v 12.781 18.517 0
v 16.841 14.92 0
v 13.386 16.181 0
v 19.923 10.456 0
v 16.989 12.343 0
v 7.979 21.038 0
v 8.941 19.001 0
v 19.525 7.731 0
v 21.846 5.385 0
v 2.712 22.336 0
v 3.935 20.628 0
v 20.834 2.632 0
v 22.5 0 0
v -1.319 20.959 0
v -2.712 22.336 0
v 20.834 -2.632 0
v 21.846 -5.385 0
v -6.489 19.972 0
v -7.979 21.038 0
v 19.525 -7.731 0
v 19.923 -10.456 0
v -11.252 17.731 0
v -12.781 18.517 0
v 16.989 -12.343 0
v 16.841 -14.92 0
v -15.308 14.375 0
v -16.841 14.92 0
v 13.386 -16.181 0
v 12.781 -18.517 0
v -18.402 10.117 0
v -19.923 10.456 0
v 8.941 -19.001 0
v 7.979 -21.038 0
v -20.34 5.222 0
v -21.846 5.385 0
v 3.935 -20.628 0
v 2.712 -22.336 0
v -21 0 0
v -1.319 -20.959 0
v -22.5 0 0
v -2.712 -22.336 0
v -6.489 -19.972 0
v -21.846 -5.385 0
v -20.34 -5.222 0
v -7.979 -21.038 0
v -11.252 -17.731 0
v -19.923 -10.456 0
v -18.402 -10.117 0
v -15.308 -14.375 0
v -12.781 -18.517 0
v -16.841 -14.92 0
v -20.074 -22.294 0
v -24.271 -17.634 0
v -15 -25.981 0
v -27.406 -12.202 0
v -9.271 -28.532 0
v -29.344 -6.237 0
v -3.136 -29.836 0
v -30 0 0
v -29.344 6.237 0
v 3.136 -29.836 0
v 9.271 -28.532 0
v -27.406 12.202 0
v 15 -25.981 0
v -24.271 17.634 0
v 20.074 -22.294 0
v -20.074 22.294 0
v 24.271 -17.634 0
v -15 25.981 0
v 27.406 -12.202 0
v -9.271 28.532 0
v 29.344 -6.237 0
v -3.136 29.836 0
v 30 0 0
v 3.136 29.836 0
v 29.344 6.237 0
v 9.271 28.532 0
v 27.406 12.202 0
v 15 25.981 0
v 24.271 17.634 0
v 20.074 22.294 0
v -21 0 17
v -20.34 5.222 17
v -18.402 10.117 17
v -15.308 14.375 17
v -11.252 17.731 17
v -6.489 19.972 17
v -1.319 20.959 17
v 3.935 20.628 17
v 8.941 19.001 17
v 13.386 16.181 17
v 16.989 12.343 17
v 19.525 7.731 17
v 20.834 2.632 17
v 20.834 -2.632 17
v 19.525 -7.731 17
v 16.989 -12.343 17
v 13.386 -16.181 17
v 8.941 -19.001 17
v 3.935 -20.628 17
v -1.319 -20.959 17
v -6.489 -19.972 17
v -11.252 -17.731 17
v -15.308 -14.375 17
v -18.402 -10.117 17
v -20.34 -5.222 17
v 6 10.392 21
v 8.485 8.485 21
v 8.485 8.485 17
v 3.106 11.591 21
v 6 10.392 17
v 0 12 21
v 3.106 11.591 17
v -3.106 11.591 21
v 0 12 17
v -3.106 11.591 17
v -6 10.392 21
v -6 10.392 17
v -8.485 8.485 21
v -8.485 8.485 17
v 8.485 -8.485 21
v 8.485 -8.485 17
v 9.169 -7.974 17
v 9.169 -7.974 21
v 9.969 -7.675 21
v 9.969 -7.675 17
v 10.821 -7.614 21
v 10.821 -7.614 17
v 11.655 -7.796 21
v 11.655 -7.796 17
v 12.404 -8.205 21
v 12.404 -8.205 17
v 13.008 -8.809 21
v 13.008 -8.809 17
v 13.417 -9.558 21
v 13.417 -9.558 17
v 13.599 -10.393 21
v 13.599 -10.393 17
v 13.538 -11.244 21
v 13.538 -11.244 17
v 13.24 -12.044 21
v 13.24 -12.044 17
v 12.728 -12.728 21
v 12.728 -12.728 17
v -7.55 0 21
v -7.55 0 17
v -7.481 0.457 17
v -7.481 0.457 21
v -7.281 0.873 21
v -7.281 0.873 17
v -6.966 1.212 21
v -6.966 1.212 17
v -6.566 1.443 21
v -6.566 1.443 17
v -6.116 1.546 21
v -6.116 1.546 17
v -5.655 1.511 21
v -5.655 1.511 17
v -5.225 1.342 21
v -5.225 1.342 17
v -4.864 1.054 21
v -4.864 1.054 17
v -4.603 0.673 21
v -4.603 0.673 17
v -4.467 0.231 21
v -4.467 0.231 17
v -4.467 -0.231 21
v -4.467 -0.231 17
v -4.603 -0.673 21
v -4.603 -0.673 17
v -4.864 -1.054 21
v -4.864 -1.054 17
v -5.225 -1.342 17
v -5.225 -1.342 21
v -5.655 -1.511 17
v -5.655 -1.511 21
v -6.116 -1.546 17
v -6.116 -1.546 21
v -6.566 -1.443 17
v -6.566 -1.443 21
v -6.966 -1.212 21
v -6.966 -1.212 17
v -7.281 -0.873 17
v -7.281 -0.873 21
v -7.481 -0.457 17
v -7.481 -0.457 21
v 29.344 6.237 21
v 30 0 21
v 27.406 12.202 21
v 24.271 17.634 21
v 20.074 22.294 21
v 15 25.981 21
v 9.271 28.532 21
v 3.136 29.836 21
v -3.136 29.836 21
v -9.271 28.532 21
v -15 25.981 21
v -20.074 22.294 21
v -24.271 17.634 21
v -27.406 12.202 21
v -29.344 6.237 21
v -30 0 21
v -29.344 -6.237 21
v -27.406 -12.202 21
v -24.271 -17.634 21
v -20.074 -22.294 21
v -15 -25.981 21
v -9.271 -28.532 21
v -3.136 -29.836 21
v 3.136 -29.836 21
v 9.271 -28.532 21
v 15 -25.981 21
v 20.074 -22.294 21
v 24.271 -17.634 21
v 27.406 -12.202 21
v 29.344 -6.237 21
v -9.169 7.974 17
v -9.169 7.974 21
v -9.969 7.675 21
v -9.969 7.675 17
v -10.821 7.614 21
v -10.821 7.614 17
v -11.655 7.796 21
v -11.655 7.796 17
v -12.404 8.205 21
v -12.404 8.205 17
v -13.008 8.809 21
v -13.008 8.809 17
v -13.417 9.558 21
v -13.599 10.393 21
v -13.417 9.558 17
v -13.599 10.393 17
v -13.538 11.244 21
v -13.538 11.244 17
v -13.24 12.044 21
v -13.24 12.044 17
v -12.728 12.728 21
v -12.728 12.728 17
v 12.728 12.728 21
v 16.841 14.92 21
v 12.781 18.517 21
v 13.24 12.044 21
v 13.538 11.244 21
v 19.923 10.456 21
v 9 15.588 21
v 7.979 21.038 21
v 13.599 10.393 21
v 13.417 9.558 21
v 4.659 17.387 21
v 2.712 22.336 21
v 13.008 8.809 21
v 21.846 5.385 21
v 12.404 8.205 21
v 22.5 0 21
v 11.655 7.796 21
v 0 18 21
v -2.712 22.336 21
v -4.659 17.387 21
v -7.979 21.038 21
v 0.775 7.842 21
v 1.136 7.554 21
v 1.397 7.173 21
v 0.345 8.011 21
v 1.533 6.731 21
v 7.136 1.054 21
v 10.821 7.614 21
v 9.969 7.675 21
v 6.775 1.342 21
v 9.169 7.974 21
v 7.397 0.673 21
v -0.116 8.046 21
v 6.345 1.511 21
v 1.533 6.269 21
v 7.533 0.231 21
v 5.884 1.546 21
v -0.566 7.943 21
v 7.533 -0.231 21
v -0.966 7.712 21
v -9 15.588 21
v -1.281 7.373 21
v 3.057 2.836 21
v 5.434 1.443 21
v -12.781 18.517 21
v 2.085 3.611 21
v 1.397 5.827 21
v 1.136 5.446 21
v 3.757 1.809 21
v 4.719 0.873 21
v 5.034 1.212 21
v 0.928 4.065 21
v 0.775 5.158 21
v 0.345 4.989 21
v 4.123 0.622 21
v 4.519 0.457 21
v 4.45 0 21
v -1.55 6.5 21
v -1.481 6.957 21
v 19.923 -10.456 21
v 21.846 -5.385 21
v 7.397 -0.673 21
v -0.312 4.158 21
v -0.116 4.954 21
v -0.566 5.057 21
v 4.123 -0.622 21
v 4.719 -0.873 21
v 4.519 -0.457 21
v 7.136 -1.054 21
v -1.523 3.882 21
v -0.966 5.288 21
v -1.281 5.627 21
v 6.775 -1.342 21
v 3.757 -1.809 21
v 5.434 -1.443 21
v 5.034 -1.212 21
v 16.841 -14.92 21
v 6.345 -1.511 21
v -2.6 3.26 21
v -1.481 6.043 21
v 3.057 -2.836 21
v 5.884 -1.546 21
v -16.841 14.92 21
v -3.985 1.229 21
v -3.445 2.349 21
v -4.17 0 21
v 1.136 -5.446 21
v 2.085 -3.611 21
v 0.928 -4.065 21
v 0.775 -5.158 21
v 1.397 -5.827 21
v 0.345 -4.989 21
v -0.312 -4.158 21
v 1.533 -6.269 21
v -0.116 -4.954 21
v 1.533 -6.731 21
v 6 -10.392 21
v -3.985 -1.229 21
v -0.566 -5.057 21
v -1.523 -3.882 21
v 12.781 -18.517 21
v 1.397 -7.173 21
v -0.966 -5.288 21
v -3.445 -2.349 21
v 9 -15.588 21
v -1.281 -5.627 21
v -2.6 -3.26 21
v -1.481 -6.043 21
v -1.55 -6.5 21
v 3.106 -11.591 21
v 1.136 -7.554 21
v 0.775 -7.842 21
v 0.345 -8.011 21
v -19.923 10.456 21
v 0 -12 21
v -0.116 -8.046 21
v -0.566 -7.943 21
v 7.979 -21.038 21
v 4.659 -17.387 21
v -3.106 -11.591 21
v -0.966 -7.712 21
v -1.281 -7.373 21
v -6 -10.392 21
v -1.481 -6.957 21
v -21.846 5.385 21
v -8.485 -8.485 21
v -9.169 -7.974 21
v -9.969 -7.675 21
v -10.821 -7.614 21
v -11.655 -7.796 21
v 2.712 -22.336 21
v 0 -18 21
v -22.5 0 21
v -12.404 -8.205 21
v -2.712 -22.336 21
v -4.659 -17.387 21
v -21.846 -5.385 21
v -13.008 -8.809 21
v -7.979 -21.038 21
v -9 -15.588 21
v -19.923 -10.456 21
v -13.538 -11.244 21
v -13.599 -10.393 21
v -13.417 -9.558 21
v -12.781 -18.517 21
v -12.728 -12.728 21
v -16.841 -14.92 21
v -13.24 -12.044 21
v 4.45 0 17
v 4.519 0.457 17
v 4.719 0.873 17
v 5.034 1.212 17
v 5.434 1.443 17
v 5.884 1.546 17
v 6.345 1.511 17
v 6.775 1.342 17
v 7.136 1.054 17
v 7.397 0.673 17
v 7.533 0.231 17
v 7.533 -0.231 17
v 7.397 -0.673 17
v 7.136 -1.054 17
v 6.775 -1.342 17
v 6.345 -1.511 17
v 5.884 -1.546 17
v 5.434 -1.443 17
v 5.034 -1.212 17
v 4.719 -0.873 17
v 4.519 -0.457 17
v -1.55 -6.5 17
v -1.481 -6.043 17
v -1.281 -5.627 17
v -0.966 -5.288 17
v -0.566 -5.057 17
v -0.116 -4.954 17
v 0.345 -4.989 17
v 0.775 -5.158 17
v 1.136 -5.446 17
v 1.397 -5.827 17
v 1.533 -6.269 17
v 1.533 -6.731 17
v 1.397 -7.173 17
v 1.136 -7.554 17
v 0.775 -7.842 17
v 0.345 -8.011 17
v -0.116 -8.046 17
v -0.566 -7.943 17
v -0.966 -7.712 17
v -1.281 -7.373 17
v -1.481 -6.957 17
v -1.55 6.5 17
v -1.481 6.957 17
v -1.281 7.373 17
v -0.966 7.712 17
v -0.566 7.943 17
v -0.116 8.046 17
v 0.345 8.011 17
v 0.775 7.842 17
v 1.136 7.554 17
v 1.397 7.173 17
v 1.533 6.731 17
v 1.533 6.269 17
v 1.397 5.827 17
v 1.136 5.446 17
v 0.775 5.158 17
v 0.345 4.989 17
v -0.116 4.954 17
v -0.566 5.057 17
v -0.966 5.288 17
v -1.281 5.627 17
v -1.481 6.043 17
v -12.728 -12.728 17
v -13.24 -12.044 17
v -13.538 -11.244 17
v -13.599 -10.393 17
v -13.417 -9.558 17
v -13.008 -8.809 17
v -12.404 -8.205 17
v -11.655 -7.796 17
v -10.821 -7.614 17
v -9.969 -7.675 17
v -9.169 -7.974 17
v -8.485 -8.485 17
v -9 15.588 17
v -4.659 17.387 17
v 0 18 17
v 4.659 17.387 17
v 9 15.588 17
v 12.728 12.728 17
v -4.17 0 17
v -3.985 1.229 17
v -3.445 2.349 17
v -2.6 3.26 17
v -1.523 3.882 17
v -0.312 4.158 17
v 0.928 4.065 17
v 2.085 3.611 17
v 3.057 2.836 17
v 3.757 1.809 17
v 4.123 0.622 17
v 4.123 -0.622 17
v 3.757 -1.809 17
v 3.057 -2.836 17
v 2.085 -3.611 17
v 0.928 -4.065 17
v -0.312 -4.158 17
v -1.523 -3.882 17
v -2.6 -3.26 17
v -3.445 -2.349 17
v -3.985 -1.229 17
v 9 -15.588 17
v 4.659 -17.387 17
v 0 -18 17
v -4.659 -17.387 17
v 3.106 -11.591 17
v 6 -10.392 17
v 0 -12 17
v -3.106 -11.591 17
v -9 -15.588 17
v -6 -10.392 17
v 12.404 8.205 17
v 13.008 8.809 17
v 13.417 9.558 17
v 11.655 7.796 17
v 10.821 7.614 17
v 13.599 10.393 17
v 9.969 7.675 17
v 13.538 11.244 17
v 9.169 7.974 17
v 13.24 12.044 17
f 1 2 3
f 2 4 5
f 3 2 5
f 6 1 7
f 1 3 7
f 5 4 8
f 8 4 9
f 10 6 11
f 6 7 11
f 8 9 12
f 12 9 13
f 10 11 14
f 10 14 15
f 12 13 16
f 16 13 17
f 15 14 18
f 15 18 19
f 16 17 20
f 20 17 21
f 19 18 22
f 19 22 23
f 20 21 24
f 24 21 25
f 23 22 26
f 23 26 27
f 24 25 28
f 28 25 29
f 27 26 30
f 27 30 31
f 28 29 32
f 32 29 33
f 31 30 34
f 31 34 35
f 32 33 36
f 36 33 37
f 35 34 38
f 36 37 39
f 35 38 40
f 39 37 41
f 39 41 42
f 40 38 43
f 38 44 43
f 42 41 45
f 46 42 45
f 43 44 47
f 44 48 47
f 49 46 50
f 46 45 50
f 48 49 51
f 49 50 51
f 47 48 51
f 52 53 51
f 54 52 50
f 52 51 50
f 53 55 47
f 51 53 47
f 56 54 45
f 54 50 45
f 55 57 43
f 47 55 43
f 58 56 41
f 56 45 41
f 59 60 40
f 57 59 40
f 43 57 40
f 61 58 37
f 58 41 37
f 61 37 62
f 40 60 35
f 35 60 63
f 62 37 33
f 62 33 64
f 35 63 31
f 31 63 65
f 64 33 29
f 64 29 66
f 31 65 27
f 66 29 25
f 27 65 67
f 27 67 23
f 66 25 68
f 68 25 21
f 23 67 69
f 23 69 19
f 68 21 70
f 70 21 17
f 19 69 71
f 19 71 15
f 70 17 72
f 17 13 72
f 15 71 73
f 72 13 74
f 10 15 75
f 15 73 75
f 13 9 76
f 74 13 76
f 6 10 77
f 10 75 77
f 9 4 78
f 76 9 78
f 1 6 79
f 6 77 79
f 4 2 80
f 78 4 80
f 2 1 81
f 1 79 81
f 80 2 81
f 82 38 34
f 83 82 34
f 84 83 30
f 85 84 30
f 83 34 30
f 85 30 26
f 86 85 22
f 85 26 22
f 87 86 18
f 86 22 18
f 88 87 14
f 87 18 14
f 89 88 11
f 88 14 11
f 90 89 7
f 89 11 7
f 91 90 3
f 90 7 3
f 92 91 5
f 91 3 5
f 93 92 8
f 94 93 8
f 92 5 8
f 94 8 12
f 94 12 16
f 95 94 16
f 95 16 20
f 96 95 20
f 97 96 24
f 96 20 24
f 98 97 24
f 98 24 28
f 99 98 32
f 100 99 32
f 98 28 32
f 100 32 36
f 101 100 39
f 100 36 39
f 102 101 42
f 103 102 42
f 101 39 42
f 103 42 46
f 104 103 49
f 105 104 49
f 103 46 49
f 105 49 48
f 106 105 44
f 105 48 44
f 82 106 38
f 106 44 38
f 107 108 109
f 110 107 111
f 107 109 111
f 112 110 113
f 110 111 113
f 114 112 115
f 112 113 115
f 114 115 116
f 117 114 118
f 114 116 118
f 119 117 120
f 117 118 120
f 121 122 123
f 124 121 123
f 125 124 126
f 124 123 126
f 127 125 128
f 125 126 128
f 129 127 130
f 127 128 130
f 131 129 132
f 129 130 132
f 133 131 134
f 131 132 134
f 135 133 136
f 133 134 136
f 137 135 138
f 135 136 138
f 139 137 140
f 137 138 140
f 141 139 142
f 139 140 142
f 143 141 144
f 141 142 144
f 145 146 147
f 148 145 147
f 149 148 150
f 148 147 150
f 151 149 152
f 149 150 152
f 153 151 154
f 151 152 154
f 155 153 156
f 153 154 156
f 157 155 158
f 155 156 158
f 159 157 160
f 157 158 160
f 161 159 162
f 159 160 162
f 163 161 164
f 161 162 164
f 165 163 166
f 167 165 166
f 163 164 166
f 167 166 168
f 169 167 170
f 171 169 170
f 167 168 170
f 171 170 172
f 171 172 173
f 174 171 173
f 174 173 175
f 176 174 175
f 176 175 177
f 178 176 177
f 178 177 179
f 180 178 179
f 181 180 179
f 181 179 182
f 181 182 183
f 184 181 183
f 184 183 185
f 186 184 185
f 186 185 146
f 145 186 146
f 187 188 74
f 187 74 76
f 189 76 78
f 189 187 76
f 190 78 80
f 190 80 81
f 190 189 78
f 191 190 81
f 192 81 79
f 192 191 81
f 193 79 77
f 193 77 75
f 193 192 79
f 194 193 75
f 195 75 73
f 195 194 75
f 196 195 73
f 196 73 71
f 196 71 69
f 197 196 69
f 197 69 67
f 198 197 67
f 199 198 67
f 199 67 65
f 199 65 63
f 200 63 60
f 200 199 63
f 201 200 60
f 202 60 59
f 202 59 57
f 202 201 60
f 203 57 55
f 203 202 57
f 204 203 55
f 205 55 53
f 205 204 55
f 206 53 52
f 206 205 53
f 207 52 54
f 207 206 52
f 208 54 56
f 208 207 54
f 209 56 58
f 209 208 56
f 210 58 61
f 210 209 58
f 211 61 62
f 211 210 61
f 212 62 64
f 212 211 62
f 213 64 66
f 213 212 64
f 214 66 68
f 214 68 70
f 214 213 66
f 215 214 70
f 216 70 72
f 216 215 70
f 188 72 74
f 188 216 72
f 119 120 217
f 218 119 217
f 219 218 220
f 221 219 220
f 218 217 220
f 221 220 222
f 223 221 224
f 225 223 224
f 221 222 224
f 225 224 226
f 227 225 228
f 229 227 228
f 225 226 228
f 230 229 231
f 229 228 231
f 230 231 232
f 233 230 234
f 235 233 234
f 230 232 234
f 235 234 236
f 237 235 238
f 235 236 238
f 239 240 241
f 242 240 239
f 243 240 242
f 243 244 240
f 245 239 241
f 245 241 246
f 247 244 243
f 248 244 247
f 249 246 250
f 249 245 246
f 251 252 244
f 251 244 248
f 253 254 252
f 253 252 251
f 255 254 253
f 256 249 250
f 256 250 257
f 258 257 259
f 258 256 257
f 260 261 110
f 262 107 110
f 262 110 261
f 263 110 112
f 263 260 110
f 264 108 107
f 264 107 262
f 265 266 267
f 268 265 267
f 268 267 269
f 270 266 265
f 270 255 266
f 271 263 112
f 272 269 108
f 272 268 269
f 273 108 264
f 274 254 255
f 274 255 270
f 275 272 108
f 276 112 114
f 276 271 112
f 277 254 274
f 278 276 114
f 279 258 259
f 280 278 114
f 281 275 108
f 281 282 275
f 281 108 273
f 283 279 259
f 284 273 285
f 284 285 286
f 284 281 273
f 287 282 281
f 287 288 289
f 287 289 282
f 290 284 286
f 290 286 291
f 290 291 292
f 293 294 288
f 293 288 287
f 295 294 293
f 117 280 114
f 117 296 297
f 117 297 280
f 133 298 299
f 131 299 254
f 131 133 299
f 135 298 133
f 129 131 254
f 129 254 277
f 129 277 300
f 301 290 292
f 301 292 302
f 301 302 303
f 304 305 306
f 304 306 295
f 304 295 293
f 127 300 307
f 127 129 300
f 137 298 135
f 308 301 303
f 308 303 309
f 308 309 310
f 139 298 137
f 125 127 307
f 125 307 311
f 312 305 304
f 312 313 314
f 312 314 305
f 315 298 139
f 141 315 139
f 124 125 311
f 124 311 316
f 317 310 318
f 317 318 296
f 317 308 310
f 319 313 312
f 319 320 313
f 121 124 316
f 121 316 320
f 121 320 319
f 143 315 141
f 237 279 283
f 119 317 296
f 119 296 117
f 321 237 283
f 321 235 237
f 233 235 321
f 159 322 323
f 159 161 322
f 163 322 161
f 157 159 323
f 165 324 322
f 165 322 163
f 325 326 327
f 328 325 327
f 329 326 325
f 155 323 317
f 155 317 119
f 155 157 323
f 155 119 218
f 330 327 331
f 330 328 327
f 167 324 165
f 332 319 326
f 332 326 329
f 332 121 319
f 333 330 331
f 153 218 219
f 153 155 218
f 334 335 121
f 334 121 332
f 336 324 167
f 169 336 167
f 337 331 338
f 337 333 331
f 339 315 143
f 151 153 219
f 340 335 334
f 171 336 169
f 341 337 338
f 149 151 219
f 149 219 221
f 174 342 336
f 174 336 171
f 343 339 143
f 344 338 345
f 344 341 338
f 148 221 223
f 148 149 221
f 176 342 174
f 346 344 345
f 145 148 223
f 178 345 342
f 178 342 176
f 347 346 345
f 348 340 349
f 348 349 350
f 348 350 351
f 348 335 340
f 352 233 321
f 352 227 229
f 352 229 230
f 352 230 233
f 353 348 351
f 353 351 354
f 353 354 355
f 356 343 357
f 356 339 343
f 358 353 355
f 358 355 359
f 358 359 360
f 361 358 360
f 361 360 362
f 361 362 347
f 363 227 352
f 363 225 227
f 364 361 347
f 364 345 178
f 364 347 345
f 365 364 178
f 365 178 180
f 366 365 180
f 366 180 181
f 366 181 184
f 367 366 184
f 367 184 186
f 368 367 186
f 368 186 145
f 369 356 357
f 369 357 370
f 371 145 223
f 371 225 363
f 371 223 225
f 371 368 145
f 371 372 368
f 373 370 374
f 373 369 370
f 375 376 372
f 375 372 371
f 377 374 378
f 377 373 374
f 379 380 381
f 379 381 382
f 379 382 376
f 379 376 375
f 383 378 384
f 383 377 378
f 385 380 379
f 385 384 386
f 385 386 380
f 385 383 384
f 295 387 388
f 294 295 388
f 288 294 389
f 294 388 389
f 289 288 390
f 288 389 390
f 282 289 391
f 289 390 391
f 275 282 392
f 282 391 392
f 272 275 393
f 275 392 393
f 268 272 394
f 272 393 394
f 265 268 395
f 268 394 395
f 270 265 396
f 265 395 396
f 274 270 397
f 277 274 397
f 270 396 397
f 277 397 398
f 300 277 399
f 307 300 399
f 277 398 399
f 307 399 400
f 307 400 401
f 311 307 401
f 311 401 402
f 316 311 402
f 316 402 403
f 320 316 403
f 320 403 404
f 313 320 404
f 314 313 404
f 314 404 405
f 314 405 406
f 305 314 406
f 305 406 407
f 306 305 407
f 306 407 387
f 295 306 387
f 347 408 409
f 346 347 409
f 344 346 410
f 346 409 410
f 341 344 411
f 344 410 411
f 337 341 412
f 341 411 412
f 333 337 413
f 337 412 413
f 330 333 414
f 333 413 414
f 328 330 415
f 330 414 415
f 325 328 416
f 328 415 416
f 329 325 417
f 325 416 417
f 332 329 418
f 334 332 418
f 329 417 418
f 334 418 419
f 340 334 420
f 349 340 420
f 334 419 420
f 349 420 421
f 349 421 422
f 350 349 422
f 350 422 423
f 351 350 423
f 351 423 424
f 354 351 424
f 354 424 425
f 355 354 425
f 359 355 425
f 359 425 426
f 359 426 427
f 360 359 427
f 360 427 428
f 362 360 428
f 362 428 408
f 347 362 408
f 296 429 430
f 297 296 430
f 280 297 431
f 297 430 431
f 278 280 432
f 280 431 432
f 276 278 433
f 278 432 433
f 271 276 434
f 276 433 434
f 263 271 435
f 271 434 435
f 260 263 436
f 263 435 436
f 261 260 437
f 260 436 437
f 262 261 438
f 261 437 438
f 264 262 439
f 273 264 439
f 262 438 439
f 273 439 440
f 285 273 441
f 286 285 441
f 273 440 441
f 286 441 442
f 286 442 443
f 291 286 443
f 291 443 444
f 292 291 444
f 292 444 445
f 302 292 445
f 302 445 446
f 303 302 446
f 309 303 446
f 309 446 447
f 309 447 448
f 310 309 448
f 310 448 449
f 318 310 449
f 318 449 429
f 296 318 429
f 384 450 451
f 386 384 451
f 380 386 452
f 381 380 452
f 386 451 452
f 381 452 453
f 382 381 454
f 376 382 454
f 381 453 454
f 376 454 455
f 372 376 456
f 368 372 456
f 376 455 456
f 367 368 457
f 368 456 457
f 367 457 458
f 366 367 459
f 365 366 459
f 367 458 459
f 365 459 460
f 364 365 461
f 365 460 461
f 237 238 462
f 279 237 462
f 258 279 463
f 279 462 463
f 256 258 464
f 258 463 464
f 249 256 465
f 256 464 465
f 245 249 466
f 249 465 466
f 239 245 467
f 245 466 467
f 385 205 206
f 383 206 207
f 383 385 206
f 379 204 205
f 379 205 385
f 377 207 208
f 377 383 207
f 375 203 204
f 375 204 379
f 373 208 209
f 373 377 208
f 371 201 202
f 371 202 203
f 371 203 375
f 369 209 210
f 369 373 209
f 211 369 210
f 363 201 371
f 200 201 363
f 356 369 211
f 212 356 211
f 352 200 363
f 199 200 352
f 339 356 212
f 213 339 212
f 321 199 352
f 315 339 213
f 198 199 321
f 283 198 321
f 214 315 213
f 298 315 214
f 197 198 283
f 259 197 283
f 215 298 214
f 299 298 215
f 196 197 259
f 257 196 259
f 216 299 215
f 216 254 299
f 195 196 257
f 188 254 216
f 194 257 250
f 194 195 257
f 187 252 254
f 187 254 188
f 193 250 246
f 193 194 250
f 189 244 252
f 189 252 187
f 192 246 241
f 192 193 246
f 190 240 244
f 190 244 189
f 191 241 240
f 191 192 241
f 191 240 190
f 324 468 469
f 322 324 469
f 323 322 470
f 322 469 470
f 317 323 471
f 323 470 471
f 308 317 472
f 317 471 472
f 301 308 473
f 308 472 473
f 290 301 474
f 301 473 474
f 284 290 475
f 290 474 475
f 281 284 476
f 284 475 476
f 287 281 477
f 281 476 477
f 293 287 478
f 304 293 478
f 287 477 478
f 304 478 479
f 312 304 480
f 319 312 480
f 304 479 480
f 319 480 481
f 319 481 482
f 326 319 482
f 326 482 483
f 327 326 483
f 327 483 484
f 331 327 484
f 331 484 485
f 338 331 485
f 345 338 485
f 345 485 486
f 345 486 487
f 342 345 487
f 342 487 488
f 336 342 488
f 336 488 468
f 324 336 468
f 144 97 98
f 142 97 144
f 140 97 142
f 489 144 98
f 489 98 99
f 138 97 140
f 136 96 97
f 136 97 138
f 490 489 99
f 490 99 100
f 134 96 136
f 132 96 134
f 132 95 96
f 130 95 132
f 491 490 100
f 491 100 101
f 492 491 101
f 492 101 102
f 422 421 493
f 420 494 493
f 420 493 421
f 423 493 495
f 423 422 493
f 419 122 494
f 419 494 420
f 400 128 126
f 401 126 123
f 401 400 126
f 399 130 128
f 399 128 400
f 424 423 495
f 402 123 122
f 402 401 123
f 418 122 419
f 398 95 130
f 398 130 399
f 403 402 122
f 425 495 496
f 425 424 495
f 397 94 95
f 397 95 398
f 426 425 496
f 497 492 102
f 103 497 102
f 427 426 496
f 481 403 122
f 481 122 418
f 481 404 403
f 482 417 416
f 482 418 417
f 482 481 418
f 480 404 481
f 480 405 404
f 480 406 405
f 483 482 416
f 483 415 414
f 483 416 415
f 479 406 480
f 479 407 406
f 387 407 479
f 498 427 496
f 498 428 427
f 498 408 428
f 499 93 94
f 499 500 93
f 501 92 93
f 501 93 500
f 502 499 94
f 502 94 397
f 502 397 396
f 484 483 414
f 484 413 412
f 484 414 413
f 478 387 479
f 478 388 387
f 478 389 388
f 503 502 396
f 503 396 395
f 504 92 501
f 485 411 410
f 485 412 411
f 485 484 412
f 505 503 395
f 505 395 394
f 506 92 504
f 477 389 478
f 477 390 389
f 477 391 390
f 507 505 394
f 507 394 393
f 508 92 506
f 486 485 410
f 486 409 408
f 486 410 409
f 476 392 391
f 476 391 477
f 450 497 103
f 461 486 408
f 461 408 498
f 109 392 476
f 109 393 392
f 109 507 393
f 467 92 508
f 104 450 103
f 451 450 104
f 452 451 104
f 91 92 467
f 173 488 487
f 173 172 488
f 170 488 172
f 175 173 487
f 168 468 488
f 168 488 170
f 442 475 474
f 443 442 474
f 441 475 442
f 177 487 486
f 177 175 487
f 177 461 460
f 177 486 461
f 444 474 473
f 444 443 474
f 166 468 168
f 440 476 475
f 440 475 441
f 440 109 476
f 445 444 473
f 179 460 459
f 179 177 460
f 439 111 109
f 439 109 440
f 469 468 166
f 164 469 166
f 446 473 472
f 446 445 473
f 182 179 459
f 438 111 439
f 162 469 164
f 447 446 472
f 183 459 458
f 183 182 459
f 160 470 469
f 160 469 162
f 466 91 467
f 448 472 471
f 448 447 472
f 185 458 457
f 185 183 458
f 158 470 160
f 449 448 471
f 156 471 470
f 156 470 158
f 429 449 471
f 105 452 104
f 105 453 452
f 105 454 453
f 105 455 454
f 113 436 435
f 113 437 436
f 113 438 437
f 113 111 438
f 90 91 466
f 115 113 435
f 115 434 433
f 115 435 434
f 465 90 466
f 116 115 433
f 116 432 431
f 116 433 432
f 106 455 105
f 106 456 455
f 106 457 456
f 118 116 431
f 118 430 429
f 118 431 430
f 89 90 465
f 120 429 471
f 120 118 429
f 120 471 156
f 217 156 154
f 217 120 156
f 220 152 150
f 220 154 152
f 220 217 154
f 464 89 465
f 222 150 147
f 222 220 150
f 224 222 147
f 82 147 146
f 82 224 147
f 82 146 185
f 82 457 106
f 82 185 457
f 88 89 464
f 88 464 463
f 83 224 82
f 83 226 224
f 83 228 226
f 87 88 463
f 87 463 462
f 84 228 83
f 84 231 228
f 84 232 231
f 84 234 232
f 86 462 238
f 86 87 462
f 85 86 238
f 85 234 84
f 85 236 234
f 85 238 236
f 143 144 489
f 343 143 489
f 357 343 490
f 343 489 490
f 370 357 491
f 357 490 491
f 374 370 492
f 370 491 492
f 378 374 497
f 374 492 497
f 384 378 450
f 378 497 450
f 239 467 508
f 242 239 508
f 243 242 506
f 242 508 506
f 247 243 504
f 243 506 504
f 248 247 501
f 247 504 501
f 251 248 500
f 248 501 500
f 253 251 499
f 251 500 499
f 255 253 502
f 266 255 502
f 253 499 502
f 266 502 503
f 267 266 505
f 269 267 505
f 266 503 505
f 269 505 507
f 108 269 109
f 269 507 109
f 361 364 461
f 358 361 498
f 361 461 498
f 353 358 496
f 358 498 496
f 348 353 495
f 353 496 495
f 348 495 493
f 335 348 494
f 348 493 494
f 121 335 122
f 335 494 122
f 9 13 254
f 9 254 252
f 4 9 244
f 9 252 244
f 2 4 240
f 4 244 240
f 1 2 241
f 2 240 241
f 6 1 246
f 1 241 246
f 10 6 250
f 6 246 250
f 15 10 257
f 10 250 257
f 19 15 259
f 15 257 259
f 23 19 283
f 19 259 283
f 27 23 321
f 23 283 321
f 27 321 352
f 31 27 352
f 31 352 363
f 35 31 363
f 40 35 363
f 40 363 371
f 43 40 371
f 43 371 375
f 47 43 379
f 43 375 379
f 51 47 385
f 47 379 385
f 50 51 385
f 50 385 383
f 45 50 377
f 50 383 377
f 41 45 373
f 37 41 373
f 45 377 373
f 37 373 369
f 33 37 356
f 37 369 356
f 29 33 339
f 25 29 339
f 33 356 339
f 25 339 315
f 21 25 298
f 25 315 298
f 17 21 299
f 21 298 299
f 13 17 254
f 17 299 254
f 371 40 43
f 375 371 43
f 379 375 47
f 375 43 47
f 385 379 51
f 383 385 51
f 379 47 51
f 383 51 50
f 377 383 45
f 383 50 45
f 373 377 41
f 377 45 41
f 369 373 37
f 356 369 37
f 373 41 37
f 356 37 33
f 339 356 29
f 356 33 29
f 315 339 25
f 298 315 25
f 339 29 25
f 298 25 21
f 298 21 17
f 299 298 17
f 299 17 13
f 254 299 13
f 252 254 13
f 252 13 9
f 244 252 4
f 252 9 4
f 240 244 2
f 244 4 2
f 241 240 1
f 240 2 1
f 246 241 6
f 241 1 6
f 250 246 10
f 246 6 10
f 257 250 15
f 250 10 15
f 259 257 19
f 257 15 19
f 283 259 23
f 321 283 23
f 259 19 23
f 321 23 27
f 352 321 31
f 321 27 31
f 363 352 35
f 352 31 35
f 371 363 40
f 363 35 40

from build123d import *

# Parameters (mm, degrees)
SKETCH_1_R          = 22.5
EXTRUDE_1_DEPTH     = 21
SKETCH_2_R          = 21
CUT_EXTRUDE_1_DEPTH = 17
SKETCH_3_R          = 3
SKETCH_3_R_2        = 4.17
SKETCH_3_R_3        = 1.55
CUT_EXTRUDE_2_DEPTH = 37.076308015
SKETCH_5_R          = 30
SKETCH_5_R_2        = 22.5
EXTRUDE_2_DEPTH     = 21


with BuildPart() as part:
    # ｽｹｯﾁ1 → ﾎﾞｽ - 押し出し1 (new body)
    with BuildSketch(Plane.XY):
        with Locations(Location((0, 0, 0), (0, 0, 180))):
            Circle(SKETCH_1_R)
    extrude(amount=EXTRUDE_1_DEPTH)

    # ｽｹｯﾁ2 → ｶｯﾄ - 押し出し1 (cut)
    with BuildSketch(Plane(origin=(0, 0, 0), x_dir=(-1, 0, 0), z_dir=(0, 0, -1))):
        Circle(SKETCH_2_R)
    extrude(amount=-CUT_EXTRUDE_1_DEPTH, mode=Mode.SUBTRACT)

    # ｽｹｯﾁ3 → ｶｯﾄ - 押し出し2 (cut, through all)
    with BuildSketch(Plane(origin=(0, 0, 17), x_dir=(-1, 0, 0), z_dir=(0, 0, -1))):
        with BuildLine():
            ThreePointArc((-12.727922061, 12.727922061), (-9.458551421, 13.378240315), (-7.606601718, 10.606601718))
            ThreePointArc((-7.606601718, 10.606601718), (-7.83496312, 9.458551421), (-8.485281374, 8.485281374))
            ThreePointArc((-8.485281374, 8.485281374), (0, 12), (8.485281374, 8.485281374))
            ThreePointArc((8.485281374, 8.485281374), (8.485281374, 12.727922061), (12.727922061, 12.727922061))
            ThreePointArc((12.727922061, 12.727922061), (0, 18), (-12.727922061, 12.727922061))
        make_face()
        with Locations((-10.606601718, 10.606601718)):
            Circle(SKETCH_3_R)
        with Locations((10.606601718, 10.606601718)):
            Circle(SKETCH_3_R)
        Circle(SKETCH_3_R_2)
        with Locations((6, 0)):
            Circle(SKETCH_3_R_3)
        with Locations((0, 6.5)):
            Circle(SKETCH_3_R_3)
        with Locations((-6, 0)):
            Circle(SKETCH_3_R_3)
        with Locations((0, -6.5)):
            Circle(SKETCH_3_R_3)
        with Locations((-10.606601718, -10.606601718)):
            Circle(SKETCH_3_R)
        with BuildLine():
            ThreePointArc((12.727922061, -12.727922061), (8.485281374, -12.727922061), (8.485281374, -8.485281374))
            ThreePointArc((8.485281374, -8.485281374), (0, -12), (-8.485281374, -8.485281374))
            ThreePointArc((-8.485281374, -8.485281374), (-7.83496312, -9.458551421), (-7.606601718, -10.606601718))
            ThreePointArc((-7.606601718, -10.606601718), (-9.458551421, -13.378240315), (-12.727922061, -12.727922061))
            ThreePointArc((-12.727922061, -12.727922061), (0, -18), (12.727922061, -12.727922061))
        make_face()
        with Locations((10.606601718, -10.606601718)):
            Circle(SKETCH_3_R)
    extrude(amount=-CUT_EXTRUDE_2_DEPTH, mode=Mode.SUBTRACT)


with BuildPart() as body_2:
    # ｽｹｯﾁ5 → ﾎﾞｽ - 押し出し2 (new body)
    with BuildSketch(Plane.XY.offset(21)):
        Circle(SKETCH_5_R)
        Circle(SKETCH_5_R_2, mode=Mode.SUBTRACT)
    extrude(amount=-EXTRUDE_2_DEPTH)


solid = Compound([part.part, body_2.part])
